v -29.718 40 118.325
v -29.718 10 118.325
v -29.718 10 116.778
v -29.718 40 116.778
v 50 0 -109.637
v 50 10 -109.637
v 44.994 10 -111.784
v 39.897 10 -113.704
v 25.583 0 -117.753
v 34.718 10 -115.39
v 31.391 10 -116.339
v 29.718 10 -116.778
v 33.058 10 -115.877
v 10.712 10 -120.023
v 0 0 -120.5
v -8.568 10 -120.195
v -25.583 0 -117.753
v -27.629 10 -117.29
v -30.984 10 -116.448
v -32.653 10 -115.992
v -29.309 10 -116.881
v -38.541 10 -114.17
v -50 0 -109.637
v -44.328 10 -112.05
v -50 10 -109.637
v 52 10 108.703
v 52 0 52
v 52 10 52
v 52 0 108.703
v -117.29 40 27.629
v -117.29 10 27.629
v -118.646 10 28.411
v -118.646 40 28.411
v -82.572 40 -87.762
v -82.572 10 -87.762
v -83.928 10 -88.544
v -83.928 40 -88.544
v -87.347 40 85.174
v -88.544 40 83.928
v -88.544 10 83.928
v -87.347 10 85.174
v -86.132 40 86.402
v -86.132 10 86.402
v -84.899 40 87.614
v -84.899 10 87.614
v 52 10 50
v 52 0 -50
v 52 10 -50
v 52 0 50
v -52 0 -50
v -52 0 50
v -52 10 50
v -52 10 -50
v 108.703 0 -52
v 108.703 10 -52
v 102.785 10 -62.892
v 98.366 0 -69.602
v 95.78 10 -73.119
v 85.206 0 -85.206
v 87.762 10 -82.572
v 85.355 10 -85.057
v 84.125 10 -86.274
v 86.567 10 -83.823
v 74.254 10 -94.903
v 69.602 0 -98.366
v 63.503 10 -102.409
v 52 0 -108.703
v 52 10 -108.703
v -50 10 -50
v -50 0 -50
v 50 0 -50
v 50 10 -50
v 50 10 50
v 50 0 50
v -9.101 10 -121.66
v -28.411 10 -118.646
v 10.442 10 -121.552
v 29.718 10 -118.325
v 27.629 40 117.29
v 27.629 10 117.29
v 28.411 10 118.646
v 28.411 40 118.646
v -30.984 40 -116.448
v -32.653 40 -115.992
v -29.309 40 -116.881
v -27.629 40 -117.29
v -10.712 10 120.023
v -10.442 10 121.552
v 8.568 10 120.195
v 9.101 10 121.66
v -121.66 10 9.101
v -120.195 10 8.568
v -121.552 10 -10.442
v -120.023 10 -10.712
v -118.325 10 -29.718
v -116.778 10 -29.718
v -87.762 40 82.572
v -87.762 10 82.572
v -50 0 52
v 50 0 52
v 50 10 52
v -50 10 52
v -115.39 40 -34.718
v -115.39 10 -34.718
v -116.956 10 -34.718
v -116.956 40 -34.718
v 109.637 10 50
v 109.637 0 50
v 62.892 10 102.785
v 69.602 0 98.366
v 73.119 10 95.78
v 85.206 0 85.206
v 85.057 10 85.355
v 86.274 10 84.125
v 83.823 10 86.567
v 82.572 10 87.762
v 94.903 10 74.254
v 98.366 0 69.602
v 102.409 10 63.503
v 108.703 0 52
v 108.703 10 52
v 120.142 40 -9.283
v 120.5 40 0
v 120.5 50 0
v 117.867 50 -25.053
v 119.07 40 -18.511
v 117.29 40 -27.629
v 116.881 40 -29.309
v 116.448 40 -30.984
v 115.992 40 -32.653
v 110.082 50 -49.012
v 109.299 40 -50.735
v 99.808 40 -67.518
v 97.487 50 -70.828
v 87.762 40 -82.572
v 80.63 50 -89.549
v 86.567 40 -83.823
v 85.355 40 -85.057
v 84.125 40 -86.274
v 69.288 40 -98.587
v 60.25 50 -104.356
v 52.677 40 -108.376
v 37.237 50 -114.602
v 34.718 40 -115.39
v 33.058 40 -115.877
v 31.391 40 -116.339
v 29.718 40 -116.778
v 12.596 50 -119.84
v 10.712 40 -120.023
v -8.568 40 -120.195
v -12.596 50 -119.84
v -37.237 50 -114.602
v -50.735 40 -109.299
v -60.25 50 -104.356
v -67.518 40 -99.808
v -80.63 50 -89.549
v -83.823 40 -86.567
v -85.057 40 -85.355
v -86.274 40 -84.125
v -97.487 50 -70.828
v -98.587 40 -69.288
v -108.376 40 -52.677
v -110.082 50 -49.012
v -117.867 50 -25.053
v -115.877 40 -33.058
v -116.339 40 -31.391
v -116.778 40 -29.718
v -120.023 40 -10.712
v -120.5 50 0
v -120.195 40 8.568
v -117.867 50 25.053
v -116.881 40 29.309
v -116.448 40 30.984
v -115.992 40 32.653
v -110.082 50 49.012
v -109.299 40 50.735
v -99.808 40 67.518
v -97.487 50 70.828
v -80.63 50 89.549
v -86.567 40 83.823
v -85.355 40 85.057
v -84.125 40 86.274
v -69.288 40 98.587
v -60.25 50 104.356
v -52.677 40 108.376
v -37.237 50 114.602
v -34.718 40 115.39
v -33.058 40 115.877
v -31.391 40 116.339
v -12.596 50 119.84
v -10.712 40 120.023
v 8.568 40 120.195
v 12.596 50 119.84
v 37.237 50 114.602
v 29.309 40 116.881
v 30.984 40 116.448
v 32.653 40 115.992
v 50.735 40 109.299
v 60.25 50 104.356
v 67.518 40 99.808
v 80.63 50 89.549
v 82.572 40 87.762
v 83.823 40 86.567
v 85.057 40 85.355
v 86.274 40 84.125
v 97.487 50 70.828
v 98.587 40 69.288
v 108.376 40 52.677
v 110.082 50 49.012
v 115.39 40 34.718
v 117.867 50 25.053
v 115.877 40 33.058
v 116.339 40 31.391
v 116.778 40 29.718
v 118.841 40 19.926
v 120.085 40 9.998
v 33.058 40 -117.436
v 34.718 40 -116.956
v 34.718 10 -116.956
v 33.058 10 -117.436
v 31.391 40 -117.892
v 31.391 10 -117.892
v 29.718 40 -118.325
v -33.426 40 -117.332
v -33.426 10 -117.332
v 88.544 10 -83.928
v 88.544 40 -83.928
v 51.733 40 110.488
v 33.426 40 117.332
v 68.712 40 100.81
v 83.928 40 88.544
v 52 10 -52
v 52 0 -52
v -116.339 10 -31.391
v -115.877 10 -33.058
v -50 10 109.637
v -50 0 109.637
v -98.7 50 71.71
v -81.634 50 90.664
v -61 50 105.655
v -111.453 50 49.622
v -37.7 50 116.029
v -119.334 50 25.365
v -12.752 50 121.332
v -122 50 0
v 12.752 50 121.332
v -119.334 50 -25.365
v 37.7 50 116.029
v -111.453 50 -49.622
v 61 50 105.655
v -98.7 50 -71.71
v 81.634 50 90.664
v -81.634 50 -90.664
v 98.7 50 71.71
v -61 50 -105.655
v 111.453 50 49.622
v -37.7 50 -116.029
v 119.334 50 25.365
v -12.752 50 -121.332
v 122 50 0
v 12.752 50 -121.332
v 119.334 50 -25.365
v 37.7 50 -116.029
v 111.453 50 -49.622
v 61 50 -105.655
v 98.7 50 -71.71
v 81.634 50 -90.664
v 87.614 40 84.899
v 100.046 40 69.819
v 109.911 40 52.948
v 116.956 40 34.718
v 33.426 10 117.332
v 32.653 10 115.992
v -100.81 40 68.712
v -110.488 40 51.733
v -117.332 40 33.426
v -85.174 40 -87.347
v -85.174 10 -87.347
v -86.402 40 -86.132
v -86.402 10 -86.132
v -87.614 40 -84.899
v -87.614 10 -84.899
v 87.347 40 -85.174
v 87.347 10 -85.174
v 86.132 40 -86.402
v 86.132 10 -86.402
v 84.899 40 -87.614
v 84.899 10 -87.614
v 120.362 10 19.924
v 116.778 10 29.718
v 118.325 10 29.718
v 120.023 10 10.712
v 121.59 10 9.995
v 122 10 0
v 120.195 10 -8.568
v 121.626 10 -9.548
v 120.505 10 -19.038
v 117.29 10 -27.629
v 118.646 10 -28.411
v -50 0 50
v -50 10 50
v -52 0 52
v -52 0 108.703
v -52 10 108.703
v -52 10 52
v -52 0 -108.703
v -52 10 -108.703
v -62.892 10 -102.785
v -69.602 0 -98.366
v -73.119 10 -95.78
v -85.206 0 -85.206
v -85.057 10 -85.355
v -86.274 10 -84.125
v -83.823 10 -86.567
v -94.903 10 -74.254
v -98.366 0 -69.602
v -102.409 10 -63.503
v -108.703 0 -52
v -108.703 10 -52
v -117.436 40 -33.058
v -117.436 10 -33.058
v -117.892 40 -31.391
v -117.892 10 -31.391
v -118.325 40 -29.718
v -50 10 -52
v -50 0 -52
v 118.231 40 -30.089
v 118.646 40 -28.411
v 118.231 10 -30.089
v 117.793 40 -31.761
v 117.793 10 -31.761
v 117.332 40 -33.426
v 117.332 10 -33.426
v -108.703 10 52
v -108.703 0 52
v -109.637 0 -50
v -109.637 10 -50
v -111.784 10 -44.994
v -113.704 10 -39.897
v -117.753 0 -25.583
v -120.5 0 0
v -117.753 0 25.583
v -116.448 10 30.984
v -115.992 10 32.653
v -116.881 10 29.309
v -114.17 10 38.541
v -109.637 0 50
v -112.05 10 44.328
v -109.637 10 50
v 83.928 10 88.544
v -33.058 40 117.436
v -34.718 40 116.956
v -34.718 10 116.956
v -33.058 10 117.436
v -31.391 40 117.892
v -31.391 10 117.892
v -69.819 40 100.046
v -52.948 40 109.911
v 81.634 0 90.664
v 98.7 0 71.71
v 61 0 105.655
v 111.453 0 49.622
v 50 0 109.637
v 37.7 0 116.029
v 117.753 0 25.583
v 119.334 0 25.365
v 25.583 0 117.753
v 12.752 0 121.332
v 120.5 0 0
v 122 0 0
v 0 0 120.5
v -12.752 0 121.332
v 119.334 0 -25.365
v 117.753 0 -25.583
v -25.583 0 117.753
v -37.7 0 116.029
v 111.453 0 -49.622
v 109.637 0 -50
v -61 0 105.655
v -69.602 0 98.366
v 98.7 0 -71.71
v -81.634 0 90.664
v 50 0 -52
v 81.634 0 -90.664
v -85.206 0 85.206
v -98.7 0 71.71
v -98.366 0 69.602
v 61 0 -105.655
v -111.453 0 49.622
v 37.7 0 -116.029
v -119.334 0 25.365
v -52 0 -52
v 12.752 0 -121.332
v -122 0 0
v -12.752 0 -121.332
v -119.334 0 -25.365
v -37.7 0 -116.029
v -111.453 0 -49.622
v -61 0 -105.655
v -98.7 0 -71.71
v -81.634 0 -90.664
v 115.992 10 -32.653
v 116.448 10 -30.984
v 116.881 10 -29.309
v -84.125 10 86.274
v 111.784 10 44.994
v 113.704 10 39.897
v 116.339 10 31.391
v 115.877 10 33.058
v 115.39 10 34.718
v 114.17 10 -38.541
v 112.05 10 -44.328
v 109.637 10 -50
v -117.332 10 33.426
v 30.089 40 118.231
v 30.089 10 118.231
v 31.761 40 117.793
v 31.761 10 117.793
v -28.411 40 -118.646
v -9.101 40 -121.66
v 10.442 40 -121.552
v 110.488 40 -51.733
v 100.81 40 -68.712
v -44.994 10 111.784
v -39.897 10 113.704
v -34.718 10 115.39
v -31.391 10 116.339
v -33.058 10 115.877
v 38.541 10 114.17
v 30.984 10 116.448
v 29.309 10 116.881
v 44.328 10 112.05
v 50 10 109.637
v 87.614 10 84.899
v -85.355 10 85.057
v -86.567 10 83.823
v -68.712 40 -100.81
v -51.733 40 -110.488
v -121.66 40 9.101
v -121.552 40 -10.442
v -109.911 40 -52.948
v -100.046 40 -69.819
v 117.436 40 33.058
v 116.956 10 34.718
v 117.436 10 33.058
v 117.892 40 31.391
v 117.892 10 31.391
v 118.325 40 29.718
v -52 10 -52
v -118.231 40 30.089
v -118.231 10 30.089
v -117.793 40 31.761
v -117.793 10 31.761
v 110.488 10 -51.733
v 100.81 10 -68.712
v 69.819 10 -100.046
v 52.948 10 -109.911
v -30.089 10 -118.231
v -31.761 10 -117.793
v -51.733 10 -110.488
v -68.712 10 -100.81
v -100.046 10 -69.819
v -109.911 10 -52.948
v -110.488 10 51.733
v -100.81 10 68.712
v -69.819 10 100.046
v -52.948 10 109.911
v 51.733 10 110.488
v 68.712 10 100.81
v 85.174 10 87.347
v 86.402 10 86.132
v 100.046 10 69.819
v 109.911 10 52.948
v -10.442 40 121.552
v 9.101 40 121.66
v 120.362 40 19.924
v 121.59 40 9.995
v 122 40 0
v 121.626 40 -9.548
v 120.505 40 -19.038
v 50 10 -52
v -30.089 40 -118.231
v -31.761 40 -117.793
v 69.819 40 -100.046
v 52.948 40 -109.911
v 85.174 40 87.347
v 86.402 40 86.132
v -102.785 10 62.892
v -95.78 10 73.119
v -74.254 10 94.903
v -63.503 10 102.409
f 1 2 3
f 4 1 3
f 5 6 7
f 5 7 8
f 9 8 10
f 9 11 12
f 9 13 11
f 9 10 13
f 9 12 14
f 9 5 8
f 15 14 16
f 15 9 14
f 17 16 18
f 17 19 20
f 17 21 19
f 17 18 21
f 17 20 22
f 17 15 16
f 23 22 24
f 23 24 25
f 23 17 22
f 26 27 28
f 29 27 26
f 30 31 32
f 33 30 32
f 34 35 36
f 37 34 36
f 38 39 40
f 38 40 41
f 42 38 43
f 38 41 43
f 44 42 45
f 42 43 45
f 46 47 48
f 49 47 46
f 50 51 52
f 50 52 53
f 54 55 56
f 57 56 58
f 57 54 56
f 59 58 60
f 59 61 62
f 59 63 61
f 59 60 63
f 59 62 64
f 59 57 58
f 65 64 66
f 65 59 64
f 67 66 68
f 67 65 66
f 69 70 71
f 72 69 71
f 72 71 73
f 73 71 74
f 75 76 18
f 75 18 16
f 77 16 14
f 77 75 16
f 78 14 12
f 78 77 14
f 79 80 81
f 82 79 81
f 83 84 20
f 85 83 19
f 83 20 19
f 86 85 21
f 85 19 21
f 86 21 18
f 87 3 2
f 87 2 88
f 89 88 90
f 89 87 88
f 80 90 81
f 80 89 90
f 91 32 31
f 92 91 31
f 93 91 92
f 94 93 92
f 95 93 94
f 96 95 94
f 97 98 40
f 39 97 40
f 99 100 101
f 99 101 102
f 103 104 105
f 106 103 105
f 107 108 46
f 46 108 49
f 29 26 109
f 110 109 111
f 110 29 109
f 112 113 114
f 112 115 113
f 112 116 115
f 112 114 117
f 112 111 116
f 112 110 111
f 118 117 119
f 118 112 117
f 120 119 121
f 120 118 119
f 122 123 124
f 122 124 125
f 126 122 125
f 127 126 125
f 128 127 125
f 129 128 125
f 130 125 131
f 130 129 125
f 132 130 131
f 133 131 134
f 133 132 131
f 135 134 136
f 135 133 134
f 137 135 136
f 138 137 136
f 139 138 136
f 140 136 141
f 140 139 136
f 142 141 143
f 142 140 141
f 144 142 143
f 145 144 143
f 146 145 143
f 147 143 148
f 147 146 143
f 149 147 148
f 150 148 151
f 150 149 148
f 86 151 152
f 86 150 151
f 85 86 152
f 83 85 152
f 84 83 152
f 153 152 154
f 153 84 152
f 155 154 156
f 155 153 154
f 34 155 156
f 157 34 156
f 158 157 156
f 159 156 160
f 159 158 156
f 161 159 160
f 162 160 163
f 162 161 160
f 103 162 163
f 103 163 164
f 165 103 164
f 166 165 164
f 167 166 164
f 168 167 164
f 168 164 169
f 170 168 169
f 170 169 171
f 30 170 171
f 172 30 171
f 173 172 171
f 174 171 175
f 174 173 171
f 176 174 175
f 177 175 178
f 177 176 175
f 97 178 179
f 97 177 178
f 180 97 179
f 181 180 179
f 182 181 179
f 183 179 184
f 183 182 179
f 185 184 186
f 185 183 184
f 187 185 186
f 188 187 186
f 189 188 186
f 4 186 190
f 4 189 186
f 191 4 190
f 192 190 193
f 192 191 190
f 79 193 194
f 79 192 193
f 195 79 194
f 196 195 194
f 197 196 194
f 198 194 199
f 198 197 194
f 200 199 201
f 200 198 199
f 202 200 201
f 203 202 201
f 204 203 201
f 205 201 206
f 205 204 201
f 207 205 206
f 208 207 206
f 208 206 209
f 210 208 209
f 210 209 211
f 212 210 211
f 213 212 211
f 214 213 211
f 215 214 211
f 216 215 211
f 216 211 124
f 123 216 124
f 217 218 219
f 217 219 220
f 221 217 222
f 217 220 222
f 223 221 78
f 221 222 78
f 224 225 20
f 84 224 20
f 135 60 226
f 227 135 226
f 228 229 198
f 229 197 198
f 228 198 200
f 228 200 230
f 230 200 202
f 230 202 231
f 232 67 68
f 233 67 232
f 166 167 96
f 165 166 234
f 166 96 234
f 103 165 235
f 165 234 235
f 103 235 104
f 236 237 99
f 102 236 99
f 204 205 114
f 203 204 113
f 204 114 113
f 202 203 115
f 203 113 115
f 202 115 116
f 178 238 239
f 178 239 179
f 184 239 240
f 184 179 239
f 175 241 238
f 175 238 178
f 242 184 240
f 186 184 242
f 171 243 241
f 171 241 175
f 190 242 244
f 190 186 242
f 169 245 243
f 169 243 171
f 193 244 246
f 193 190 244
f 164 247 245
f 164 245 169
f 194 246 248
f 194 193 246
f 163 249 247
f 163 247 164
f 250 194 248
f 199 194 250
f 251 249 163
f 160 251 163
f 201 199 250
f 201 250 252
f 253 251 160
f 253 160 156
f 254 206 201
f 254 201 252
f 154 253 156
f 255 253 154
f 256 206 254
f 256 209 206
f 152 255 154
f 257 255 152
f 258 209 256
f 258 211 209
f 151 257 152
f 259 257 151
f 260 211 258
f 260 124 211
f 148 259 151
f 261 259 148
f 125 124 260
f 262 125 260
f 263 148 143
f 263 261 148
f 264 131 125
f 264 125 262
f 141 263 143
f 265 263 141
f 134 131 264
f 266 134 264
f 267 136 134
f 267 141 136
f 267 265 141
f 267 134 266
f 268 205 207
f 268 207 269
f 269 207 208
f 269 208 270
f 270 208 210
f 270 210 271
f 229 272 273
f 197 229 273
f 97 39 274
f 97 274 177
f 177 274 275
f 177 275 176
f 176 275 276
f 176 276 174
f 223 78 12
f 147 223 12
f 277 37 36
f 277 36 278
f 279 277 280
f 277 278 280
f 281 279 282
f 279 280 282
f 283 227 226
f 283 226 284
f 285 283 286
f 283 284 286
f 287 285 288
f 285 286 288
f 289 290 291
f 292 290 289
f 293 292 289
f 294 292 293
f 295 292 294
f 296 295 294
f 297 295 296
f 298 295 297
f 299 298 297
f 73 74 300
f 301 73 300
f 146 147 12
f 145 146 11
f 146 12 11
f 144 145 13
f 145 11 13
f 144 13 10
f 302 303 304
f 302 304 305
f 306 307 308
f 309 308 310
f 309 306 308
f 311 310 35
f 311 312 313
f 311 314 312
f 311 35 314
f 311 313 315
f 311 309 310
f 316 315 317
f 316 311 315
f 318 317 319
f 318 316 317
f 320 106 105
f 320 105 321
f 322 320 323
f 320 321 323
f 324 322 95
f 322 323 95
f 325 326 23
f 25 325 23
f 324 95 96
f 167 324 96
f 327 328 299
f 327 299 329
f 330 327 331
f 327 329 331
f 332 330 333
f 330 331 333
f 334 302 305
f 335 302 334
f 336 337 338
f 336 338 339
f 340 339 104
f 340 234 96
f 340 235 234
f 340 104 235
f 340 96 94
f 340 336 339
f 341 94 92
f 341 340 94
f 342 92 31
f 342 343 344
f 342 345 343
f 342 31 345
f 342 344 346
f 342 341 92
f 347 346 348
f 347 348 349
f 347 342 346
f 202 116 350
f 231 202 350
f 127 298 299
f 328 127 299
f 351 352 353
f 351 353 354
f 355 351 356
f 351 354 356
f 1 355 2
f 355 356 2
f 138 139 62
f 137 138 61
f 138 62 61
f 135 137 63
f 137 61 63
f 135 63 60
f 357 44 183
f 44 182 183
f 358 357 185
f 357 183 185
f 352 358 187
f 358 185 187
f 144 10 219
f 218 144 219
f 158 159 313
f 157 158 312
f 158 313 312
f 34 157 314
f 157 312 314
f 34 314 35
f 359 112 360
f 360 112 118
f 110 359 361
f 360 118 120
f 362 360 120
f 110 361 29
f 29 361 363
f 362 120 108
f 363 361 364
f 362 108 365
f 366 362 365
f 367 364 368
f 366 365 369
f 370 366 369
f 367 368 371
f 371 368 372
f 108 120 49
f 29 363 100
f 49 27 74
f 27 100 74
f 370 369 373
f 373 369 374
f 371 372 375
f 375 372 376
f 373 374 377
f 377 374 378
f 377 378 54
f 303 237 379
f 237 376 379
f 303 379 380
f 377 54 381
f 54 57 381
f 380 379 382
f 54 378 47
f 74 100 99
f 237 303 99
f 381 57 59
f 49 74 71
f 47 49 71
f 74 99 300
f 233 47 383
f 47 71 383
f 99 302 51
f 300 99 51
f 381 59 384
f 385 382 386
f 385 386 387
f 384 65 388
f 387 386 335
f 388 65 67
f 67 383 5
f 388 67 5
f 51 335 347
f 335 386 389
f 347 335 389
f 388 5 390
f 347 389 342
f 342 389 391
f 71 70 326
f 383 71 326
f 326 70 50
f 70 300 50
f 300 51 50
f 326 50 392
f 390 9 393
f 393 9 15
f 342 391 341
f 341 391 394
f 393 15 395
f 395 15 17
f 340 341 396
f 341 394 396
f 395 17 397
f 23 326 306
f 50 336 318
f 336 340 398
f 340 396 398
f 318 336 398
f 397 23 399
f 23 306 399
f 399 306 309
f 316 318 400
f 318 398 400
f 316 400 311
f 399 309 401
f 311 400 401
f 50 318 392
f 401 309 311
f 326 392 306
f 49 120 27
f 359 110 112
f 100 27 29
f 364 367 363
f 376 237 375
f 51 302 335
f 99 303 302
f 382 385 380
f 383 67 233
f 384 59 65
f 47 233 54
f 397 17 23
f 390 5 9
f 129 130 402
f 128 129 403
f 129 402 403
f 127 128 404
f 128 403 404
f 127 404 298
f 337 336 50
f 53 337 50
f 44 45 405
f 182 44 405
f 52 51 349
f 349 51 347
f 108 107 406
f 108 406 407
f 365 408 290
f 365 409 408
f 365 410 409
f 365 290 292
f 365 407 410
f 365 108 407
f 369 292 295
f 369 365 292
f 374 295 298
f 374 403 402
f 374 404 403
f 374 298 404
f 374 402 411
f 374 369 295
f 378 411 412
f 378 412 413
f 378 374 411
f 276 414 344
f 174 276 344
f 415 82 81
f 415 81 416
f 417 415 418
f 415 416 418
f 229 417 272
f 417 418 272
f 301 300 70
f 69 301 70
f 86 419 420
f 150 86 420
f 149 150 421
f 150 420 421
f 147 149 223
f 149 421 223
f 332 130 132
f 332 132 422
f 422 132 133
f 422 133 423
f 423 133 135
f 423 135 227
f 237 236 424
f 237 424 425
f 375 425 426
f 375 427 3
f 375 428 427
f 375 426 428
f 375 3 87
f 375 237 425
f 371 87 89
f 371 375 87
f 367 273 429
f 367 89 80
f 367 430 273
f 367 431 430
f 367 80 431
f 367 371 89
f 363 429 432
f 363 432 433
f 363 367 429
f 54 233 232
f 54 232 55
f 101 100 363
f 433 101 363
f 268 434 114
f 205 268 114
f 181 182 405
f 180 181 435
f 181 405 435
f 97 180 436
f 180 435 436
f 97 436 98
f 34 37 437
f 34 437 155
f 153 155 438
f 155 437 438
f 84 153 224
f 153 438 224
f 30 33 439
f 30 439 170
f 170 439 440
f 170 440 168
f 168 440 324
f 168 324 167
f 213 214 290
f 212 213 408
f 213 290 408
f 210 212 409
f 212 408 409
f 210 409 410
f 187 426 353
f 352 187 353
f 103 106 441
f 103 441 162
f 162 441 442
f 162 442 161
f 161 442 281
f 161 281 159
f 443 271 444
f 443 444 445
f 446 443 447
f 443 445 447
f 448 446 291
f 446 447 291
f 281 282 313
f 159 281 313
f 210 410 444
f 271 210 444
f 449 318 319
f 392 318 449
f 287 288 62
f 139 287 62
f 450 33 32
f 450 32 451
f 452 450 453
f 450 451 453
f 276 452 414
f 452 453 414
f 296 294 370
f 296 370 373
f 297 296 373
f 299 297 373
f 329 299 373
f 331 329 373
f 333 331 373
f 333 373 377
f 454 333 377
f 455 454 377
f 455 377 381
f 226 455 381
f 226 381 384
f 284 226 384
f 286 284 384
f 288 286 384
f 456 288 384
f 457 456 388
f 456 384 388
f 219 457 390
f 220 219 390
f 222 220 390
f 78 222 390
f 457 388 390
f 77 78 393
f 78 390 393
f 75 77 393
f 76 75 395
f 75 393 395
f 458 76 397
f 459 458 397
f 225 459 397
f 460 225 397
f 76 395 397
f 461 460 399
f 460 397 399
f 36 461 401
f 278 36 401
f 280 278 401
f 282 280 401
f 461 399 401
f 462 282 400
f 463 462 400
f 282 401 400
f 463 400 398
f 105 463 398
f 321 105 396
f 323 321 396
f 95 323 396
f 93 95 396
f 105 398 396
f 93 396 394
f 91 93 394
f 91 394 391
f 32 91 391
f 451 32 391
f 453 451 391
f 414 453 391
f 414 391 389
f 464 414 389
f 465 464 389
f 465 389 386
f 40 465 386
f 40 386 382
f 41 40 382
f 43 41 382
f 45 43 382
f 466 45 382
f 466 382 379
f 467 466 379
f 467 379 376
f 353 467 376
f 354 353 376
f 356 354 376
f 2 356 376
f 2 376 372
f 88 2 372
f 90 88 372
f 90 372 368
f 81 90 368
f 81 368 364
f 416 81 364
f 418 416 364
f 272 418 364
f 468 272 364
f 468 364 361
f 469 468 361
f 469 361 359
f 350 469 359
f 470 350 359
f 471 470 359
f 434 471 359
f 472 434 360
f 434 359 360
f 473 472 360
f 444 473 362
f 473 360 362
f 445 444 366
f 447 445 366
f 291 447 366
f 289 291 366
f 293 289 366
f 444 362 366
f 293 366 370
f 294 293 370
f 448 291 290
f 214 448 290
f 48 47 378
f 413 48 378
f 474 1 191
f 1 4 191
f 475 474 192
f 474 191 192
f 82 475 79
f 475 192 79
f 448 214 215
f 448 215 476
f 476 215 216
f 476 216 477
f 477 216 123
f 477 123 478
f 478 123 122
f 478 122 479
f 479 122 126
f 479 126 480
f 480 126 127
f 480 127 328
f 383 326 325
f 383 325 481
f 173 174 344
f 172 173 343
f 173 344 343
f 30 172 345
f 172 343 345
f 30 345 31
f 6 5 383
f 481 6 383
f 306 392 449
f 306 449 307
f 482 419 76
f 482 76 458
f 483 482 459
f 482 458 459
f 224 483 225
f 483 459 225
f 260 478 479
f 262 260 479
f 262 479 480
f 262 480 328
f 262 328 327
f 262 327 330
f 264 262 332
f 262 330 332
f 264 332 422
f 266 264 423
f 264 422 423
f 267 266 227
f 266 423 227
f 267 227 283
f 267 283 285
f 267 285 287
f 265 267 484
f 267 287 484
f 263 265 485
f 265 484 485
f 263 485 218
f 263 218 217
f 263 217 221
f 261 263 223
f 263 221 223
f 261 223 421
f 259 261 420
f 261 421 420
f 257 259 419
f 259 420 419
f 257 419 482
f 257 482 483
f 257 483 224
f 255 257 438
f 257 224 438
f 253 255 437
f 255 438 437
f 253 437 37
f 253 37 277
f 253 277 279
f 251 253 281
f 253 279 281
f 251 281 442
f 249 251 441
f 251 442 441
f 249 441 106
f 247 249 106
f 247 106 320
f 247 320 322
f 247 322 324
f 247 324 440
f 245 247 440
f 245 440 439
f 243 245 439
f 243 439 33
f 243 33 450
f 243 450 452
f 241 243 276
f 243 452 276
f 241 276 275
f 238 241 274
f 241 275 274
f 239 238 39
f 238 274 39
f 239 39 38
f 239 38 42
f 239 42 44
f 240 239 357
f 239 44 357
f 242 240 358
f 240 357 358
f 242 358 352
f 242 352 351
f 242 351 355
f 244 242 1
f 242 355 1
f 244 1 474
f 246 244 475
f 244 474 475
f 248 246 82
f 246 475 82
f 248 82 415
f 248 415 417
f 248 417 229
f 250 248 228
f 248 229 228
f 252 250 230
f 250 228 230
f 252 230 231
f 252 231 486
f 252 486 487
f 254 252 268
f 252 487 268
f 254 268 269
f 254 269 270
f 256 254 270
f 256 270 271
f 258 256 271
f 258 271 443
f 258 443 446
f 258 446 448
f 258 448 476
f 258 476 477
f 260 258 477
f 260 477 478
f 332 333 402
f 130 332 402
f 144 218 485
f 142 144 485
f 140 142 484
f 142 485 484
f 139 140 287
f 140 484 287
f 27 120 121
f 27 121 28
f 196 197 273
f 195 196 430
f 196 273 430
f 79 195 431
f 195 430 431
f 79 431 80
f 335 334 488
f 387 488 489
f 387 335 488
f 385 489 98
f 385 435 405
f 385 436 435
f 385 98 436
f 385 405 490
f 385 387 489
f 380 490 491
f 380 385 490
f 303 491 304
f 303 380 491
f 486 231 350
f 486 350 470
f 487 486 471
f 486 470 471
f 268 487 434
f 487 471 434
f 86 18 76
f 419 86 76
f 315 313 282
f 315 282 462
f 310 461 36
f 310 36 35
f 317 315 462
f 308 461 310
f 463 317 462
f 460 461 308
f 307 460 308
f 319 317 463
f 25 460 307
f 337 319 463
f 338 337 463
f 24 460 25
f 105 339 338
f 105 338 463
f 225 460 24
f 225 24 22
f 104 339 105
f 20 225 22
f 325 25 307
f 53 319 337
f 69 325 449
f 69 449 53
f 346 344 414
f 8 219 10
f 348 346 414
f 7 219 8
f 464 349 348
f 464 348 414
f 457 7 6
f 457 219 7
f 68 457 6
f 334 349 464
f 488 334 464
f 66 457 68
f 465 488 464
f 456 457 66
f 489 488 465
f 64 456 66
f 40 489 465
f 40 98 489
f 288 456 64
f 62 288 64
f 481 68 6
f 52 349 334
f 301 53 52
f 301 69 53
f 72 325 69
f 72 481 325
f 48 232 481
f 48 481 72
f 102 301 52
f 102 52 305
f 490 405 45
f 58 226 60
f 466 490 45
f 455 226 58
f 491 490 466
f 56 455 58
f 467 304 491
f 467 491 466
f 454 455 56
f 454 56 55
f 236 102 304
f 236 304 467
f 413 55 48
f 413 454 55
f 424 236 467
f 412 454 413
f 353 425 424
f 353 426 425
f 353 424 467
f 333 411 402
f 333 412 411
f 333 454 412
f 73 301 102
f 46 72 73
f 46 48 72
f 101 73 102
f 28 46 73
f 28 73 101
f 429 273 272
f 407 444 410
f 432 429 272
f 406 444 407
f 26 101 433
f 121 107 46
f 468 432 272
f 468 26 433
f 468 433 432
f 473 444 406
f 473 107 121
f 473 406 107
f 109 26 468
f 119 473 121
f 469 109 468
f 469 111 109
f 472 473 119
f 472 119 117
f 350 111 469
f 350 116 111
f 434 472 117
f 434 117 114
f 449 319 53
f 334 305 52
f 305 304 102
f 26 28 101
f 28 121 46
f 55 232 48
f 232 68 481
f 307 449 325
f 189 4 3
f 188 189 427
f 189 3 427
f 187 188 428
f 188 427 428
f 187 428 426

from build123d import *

# Parameters (mm, degrees)
SKETCH1_R           = 122
SKETCH1_R_2         = 120.5
BOSS_EXTRUDE1_DEPTH = 10
BOSS_EXTRUDE2_DEPTH = 30
CIRPATTERN1_COUNT   = 12
SKETCH4_R           = 122
SKETCH4_R_2         = 120.5
BOSS_EXTRUDE3_DEPTH = 10
SKETCH6_W           = 2
SKETCH6_H           = 219.273801444
BOSS_EXTRUDE4_DEPTH = 10
CIRPATTERN2_COUNT   = 4


with BuildPart() as part:
    # Sketch1 → Boss-Extrude1 (new body)
    with BuildSketch(Plane(origin=(0, 0, 0), x_dir=(1, 0, 0), z_dir=(0, 1, 0))):
        Circle(SKETCH1_R)
        Circle(SKETCH1_R_2, mode=Mode.SUBTRACT)
    extrude(amount=BOSS_EXTRUDE1_DEPTH)

    # Sketch3 → Boss-Extrude2 (add)
    with BuildSketch(Plane(origin=(0, 10, 0), x_dir=(1, 0, 0), z_dir=(0, 1, 0))):
        with BuildLine():
            Line((34.717842259, 115.390300411), (34.717842259, 116.955852478))
            ThreePointArc((34.717842259, 116.955852478), (32.225116431, 117.66708066), (29.717842259, 118.325186885))
            Line((29.717842259, 118.325186885), (29.717842259, 116.777993866))
            ThreePointArc((29.717842259, 116.777993866), (32.22531277, 116.111064145), (34.717842259, 115.390300411))
        make_face()
    boss_extrude2 = extrude(amount=BOSS_EXTRUDE2_DEPTH)

    # CirPattern1: Boss-Extrude2 ×12 about axis
    cirpattern1_axis = Axis((0, 0, 0), (0, 1, 0))
    for i in range(1, CIRPATTERN1_COUNT):
        add(boss_extrude2.rotate(cirpattern1_axis, i * 360 / CIRPATTERN1_COUNT))

    # Sketch4 → Boss-Extrude3 (add)
    with BuildSketch(Plane(origin=(0, 40, 0), x_dir=(1, 0, 0), z_dir=(0, 1, 0))):
        Circle(SKETCH4_R)
        Circle(SKETCH4_R_2, mode=Mode.SUBTRACT)
    extrude(amount=BOSS_EXTRUDE3_DEPTH)

    # Sketch6 → Boss-Extrude4 (add)
    with BuildSketch(Plane(origin=(0, 0, 0), x_dir=(1, 0, 0), z_dir=(0, 1, 0))):
        with Locations((-51, 0)):
            Rectangle(SKETCH6_W, SKETCH6_H)
    boss_extrude4 = extrude(amount=BOSS_EXTRUDE4_DEPTH)

    # CirPattern2: Boss-Extrude4 ×4 about axis
    cirpattern2_axis = Axis((0, 0, 0), (0, 1, 0))
    for i in range(1, CIRPATTERN2_COUNT):
        add(boss_extrude4.rotate(cirpattern2_axis, i * 360 / CIRPATTERN2_COUNT))


solid = part.part
